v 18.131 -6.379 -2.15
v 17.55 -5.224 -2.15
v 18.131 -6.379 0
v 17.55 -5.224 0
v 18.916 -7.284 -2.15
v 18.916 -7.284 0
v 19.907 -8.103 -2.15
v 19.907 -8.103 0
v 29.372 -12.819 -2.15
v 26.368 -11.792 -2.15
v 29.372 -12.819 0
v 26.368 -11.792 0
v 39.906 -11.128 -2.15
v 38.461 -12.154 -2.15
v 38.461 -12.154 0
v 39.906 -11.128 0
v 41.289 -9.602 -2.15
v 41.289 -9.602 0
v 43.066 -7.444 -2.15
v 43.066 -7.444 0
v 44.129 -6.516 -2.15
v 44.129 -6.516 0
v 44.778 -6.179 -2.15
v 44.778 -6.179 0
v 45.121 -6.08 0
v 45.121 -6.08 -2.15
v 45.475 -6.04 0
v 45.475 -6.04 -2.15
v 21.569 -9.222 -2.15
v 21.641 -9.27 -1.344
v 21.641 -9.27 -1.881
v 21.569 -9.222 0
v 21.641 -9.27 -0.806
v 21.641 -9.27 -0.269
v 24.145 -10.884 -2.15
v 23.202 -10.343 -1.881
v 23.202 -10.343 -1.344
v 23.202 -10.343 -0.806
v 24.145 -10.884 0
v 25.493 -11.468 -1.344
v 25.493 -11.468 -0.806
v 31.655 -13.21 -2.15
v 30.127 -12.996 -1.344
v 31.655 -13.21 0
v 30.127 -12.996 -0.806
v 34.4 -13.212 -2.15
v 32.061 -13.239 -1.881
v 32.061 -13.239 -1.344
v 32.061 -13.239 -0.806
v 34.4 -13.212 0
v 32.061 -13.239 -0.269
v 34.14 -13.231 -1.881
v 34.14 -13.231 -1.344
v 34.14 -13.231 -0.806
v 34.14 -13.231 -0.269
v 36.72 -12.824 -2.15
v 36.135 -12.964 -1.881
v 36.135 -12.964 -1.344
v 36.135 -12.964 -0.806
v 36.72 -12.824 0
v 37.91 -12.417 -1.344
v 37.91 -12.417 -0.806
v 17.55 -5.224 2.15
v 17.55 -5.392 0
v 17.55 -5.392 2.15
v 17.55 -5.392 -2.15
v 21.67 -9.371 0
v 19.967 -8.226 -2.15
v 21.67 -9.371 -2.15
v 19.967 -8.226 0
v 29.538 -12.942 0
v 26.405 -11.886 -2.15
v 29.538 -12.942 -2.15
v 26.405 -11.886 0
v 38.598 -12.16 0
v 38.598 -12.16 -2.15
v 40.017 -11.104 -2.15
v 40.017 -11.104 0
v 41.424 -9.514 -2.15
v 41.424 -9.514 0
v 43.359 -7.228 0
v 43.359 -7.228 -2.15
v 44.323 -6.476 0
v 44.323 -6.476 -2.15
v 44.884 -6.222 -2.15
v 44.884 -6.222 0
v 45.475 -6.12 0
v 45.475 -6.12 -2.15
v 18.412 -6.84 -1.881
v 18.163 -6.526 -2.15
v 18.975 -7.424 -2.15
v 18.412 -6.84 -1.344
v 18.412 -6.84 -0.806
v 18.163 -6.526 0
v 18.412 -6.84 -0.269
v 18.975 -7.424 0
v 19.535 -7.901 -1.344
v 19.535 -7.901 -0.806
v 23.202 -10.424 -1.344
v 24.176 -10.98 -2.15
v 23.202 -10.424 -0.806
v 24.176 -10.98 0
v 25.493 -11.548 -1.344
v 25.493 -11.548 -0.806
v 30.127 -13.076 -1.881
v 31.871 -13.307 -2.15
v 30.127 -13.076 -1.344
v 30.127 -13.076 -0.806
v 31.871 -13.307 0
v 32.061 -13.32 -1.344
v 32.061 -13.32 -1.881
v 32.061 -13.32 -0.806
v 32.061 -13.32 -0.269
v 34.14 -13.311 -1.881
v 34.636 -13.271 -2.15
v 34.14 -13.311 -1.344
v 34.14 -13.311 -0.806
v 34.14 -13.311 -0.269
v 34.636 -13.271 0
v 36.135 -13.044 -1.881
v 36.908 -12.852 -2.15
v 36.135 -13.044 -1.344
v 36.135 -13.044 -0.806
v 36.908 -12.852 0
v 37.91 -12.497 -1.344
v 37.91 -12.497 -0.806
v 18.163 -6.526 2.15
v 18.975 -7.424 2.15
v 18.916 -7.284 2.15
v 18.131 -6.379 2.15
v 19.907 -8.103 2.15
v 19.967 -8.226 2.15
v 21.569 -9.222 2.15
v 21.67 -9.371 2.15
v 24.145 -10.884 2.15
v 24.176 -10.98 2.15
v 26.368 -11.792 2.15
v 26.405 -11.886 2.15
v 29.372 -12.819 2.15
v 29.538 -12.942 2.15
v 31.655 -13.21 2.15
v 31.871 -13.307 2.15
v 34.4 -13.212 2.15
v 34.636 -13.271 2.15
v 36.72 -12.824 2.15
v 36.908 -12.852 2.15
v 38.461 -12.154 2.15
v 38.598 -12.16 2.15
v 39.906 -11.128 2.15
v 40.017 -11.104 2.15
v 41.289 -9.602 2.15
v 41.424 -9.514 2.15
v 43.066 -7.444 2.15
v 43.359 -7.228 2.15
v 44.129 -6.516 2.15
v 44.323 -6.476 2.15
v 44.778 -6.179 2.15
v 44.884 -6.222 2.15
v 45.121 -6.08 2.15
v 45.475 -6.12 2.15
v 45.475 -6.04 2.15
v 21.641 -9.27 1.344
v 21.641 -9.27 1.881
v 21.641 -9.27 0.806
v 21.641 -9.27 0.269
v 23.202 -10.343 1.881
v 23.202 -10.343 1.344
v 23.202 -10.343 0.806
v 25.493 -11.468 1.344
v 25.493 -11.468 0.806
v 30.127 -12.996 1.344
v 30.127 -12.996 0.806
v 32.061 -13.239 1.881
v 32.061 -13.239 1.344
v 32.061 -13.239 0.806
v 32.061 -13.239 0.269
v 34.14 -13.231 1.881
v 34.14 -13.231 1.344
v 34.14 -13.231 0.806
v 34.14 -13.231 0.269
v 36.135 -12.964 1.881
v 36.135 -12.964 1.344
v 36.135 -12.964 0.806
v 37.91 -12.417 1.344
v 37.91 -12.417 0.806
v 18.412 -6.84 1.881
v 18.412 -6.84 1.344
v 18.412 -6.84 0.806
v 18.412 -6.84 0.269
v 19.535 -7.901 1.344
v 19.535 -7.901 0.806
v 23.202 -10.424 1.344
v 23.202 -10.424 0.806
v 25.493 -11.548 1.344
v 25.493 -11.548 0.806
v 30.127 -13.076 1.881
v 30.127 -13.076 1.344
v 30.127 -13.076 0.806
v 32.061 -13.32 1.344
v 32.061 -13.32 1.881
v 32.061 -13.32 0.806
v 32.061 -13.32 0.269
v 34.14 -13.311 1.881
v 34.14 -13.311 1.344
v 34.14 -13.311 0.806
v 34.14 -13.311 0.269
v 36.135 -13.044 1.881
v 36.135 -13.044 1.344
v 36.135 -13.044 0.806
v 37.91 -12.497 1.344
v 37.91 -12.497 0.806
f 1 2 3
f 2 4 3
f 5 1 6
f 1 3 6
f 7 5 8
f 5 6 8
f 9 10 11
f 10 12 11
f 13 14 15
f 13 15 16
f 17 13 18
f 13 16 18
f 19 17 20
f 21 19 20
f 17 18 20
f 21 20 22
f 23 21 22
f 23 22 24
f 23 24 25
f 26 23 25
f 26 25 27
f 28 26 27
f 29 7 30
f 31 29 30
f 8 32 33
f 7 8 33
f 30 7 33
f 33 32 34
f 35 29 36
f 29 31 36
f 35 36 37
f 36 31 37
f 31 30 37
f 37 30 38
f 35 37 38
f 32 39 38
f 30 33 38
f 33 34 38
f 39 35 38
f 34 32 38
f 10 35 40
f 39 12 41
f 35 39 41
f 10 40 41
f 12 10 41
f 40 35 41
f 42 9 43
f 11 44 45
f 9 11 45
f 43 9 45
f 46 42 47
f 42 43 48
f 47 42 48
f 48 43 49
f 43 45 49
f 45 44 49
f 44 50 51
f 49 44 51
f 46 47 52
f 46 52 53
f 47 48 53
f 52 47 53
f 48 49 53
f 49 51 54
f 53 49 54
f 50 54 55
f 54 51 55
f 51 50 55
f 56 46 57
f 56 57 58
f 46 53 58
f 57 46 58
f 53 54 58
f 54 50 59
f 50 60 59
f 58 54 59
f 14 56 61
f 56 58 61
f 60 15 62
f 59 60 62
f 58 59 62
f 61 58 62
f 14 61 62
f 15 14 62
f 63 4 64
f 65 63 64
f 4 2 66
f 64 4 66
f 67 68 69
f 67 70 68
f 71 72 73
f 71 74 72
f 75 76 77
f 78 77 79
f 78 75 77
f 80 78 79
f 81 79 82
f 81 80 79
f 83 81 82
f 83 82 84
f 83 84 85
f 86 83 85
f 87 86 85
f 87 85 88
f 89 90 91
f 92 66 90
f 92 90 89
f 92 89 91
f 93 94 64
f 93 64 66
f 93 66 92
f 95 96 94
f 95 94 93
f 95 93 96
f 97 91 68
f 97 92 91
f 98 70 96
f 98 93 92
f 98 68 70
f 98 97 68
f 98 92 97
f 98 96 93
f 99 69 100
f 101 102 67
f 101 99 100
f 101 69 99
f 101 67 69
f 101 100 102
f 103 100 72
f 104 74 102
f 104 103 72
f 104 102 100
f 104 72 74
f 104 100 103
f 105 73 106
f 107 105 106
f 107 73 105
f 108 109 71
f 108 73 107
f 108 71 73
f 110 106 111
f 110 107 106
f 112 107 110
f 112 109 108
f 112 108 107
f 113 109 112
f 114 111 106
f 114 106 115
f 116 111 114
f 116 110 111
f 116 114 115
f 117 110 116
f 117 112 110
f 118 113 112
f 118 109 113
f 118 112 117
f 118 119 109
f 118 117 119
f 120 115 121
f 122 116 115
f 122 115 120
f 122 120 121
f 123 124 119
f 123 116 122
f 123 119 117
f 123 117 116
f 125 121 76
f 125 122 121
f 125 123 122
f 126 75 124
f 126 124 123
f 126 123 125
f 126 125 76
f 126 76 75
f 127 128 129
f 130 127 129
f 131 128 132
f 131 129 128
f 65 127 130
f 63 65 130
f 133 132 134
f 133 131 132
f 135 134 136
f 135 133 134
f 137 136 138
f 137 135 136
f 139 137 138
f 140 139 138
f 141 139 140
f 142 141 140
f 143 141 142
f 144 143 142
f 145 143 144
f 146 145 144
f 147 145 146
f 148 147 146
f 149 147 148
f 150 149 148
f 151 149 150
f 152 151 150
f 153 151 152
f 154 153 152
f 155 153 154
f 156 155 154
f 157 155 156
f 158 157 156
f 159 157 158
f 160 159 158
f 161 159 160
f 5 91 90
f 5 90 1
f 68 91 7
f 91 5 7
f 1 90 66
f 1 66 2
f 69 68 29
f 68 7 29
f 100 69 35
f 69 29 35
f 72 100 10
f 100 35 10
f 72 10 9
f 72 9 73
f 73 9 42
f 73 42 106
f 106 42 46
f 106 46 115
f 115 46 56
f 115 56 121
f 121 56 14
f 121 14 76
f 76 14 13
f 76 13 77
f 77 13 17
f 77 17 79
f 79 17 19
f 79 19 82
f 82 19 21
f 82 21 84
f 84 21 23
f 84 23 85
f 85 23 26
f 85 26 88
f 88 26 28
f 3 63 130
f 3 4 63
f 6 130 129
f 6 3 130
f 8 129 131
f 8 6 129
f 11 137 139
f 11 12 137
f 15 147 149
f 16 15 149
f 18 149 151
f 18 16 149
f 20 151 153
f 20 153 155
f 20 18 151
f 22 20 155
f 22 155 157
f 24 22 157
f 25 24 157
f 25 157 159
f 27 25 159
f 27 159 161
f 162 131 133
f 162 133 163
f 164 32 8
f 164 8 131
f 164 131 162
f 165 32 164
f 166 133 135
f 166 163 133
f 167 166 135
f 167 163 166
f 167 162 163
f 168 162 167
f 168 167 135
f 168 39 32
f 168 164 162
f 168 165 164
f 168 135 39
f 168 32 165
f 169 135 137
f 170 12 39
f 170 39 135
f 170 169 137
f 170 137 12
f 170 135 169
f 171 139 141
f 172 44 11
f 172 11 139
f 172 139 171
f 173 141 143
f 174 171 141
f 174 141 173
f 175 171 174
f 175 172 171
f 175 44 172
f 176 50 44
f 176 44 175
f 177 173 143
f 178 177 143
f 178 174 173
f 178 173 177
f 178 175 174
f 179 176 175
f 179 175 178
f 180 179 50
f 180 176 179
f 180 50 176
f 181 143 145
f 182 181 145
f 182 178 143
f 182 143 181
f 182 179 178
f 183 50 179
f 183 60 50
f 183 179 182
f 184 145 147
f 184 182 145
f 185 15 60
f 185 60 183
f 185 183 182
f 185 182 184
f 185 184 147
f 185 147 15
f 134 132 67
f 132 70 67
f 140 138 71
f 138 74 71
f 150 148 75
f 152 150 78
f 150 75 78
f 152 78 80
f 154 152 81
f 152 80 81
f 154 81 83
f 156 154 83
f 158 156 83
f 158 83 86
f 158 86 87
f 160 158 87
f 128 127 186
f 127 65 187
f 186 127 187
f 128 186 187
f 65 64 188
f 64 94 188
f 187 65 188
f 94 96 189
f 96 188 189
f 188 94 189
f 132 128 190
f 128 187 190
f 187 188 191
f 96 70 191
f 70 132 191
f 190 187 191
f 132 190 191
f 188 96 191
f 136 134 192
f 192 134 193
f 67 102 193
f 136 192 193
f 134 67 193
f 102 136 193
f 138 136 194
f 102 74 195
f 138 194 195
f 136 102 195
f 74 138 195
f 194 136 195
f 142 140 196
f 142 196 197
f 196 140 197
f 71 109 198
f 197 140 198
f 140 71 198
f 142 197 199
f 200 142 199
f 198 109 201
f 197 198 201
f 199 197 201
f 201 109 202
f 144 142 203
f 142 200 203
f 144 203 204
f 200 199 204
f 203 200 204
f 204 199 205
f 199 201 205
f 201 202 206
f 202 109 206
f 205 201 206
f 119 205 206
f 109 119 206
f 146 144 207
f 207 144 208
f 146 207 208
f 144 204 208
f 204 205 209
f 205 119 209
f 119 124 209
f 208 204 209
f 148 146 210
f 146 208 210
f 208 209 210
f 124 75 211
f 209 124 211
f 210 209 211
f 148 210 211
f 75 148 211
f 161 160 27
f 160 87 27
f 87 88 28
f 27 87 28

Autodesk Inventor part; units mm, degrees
ref_plane "YZ Plane" through (0, 0, 0) normal (1, 0, 0) x (0, 1, 0)
ref_plane "XZ Plane" through (0, 0, 0) normal (0, 1, 0) x (-1, 0, 0)
ref_plane "XY Plane" through (0, 0, 0) normal (0, 0, 1) x (1, 0, 0)
sketch "Sketch1" plane through (0, 0, 0) normal (0, 0, 1) x (1, 0, 0)
  line L0 (45.4747, -6.1198) -> (45.4747, -6.0398) projected
  line L1 (17.55, -5.224) -> (17.55, -6.424) projected
  spline S0 degree 4 poles (17.55, -5.224) (18.1179, -6.9858) (20.2608, -8.3998) (21.7184, -9.2319) (24.0831, -11.0699) (27.3474, -12.0685) (29.8264, -13.2026) (34.2657, -13.4498) (39.6246, -12.3661) (41.4108, -9.7184) (43.5576, -6.0878) (45.4747, -6.0398) knots 0 0 0 0 0 0.200534 0.27813 0.360254 0.453696 0.554907 0.655457 0.758151 1 1 1 1 1
  spline S1 degree 4 poles (17.55, -5.3915) (18.1456, -7.07) (20.2684, -8.4898) (21.7242, -9.3161) (24.0831, -11.1511) (27.3475, -12.149) (29.8264, -13.2831) (34.2658, -13.5299) (39.6246, -12.4461) (41.4108, -9.7984) (43.5576, -6.1678) (45.4747, -6.1198) knots 0 0 0 0 0 0.199686 0.277363 0.359573 0.453114 0.554431 0.655089 0.757892 1 1 1 1 1
  point P0 (0, 0)
  point P1 (19.3337, -7.6566)
  point P2 (21, -8.8468)
  point P3 (22.2794, -9.7097)
  point P4 (23.9457, -10.7809)
  point P5 (26.8618, -11.9711)
  point P6 (29.8516, -12.937)
  point P7 (34.2372, -13.2242)
  point P8 (38.1093, -12.3282)
  point P9 (40.4897, -10.5431)
  point P10 (42.8701, -7.6566)
  point P11 (19.3337, -7.7381)
  point P12 (21, -8.9281)
  point P13 (22.2795, -9.7908)
  point P14 (23.9458, -10.8618)
  point P15 (26.8618, -12.0517)
  point P16 (29.8517, -13.0174)
  point P17 (34.2372, -13.3044)
  point P18 (38.1093, -12.4083)
  point P19 (40.4897, -10.6231)
  point P20 (42.8701, -7.7367)
extrude "Extrusion1" add sketch "Sketch1" along normal mid plane 4.3
properties part number "flexcable6"
